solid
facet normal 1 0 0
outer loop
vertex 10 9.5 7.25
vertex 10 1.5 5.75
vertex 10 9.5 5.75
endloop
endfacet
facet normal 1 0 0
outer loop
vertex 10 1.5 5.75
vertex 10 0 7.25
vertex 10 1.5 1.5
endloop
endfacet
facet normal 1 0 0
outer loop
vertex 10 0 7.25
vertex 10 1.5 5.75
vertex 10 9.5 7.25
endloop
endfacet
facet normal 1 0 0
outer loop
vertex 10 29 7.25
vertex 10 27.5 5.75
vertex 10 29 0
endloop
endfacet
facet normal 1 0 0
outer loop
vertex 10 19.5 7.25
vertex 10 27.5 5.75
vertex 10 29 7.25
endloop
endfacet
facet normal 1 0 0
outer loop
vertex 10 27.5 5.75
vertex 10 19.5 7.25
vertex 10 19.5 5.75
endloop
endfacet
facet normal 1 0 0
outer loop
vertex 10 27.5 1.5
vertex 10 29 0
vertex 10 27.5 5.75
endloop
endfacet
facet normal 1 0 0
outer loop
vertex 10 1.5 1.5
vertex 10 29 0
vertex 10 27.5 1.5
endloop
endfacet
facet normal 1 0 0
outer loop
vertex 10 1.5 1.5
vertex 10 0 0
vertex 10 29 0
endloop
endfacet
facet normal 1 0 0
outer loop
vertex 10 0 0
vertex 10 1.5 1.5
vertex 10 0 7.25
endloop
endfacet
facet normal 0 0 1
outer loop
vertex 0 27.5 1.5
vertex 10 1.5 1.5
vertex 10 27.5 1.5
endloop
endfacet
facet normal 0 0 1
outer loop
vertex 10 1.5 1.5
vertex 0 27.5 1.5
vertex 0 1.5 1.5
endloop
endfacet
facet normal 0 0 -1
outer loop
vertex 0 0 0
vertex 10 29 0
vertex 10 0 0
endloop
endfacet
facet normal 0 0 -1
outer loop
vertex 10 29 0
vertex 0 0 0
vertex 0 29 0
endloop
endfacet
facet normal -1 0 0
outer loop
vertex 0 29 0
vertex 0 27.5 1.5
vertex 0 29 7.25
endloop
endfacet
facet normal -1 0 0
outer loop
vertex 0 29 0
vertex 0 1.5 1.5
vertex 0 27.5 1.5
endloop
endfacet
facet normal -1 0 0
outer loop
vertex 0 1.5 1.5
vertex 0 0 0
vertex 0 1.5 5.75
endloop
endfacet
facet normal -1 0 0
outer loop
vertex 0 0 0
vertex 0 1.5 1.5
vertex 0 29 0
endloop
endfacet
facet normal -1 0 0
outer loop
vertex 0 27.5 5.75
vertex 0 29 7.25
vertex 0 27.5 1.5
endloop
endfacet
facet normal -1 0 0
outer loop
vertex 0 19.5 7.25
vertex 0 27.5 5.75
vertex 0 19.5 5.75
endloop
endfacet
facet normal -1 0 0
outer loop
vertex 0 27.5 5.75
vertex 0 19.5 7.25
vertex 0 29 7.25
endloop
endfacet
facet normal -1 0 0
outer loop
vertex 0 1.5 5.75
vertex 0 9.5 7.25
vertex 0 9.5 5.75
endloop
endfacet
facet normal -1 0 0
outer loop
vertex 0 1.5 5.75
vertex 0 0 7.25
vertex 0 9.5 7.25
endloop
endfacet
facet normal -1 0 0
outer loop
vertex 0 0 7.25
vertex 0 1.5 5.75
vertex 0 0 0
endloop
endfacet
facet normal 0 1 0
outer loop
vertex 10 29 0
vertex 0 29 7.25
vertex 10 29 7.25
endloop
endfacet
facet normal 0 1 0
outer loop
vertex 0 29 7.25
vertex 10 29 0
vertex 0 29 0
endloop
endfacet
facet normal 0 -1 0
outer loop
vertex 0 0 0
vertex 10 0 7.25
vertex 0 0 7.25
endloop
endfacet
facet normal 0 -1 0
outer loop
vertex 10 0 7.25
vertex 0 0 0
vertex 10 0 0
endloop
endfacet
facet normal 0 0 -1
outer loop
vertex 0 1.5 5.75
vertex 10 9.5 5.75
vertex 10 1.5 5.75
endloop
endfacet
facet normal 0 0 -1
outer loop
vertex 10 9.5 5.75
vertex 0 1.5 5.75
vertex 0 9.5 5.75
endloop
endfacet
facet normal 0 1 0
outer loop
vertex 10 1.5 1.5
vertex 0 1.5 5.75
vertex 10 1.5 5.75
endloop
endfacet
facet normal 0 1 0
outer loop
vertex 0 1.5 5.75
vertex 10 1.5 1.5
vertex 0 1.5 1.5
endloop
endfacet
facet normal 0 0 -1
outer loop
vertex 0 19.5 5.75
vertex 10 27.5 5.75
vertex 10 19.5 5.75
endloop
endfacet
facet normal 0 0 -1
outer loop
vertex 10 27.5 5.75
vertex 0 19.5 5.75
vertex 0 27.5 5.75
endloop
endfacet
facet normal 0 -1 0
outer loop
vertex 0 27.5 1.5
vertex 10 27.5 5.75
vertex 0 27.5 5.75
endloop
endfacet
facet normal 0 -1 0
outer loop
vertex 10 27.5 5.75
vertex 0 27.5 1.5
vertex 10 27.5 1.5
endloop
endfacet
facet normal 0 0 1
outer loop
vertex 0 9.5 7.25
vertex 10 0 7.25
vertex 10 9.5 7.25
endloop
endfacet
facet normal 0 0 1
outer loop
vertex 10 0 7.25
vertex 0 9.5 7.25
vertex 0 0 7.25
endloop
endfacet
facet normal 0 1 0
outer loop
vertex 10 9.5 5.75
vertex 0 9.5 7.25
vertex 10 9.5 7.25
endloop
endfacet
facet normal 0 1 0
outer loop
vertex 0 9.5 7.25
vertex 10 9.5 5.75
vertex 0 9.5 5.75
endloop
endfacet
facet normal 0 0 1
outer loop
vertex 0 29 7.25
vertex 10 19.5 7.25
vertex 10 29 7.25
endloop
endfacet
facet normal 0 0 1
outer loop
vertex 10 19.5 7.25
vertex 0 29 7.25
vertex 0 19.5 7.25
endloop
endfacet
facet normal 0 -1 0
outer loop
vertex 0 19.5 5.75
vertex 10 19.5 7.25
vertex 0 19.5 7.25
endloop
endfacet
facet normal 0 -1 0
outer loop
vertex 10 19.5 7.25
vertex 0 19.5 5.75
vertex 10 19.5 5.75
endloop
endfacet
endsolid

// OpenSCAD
length=10; //length of clip
//width=23; //width for sternum strap
width=29; //width for shoulder strap
wall_thickness=1.5; //wall thickness
gap_height=2.75; //height of gap
clip_entrance_width=width/2-5; //clip entrance

cube([length,width,wall_thickness]);
translate([0,0,wall_thickness])
    cube([length,wall_thickness,gap_height+wall_thickness]);
translate([0,width-wall_thickness,wall_thickness])
    cube([length,wall_thickness,gap_height+wall_thickness]);
translate([0,0,gap_height+2*wall_thickness])
    cube([length,clip_entrance_width,wall_thickness]);
translate([0,width-clip_entrance_width,gap_height+wall_thickness+wall_thickness])
    cube([length,clip_entrance_width,wall_thickness]);
